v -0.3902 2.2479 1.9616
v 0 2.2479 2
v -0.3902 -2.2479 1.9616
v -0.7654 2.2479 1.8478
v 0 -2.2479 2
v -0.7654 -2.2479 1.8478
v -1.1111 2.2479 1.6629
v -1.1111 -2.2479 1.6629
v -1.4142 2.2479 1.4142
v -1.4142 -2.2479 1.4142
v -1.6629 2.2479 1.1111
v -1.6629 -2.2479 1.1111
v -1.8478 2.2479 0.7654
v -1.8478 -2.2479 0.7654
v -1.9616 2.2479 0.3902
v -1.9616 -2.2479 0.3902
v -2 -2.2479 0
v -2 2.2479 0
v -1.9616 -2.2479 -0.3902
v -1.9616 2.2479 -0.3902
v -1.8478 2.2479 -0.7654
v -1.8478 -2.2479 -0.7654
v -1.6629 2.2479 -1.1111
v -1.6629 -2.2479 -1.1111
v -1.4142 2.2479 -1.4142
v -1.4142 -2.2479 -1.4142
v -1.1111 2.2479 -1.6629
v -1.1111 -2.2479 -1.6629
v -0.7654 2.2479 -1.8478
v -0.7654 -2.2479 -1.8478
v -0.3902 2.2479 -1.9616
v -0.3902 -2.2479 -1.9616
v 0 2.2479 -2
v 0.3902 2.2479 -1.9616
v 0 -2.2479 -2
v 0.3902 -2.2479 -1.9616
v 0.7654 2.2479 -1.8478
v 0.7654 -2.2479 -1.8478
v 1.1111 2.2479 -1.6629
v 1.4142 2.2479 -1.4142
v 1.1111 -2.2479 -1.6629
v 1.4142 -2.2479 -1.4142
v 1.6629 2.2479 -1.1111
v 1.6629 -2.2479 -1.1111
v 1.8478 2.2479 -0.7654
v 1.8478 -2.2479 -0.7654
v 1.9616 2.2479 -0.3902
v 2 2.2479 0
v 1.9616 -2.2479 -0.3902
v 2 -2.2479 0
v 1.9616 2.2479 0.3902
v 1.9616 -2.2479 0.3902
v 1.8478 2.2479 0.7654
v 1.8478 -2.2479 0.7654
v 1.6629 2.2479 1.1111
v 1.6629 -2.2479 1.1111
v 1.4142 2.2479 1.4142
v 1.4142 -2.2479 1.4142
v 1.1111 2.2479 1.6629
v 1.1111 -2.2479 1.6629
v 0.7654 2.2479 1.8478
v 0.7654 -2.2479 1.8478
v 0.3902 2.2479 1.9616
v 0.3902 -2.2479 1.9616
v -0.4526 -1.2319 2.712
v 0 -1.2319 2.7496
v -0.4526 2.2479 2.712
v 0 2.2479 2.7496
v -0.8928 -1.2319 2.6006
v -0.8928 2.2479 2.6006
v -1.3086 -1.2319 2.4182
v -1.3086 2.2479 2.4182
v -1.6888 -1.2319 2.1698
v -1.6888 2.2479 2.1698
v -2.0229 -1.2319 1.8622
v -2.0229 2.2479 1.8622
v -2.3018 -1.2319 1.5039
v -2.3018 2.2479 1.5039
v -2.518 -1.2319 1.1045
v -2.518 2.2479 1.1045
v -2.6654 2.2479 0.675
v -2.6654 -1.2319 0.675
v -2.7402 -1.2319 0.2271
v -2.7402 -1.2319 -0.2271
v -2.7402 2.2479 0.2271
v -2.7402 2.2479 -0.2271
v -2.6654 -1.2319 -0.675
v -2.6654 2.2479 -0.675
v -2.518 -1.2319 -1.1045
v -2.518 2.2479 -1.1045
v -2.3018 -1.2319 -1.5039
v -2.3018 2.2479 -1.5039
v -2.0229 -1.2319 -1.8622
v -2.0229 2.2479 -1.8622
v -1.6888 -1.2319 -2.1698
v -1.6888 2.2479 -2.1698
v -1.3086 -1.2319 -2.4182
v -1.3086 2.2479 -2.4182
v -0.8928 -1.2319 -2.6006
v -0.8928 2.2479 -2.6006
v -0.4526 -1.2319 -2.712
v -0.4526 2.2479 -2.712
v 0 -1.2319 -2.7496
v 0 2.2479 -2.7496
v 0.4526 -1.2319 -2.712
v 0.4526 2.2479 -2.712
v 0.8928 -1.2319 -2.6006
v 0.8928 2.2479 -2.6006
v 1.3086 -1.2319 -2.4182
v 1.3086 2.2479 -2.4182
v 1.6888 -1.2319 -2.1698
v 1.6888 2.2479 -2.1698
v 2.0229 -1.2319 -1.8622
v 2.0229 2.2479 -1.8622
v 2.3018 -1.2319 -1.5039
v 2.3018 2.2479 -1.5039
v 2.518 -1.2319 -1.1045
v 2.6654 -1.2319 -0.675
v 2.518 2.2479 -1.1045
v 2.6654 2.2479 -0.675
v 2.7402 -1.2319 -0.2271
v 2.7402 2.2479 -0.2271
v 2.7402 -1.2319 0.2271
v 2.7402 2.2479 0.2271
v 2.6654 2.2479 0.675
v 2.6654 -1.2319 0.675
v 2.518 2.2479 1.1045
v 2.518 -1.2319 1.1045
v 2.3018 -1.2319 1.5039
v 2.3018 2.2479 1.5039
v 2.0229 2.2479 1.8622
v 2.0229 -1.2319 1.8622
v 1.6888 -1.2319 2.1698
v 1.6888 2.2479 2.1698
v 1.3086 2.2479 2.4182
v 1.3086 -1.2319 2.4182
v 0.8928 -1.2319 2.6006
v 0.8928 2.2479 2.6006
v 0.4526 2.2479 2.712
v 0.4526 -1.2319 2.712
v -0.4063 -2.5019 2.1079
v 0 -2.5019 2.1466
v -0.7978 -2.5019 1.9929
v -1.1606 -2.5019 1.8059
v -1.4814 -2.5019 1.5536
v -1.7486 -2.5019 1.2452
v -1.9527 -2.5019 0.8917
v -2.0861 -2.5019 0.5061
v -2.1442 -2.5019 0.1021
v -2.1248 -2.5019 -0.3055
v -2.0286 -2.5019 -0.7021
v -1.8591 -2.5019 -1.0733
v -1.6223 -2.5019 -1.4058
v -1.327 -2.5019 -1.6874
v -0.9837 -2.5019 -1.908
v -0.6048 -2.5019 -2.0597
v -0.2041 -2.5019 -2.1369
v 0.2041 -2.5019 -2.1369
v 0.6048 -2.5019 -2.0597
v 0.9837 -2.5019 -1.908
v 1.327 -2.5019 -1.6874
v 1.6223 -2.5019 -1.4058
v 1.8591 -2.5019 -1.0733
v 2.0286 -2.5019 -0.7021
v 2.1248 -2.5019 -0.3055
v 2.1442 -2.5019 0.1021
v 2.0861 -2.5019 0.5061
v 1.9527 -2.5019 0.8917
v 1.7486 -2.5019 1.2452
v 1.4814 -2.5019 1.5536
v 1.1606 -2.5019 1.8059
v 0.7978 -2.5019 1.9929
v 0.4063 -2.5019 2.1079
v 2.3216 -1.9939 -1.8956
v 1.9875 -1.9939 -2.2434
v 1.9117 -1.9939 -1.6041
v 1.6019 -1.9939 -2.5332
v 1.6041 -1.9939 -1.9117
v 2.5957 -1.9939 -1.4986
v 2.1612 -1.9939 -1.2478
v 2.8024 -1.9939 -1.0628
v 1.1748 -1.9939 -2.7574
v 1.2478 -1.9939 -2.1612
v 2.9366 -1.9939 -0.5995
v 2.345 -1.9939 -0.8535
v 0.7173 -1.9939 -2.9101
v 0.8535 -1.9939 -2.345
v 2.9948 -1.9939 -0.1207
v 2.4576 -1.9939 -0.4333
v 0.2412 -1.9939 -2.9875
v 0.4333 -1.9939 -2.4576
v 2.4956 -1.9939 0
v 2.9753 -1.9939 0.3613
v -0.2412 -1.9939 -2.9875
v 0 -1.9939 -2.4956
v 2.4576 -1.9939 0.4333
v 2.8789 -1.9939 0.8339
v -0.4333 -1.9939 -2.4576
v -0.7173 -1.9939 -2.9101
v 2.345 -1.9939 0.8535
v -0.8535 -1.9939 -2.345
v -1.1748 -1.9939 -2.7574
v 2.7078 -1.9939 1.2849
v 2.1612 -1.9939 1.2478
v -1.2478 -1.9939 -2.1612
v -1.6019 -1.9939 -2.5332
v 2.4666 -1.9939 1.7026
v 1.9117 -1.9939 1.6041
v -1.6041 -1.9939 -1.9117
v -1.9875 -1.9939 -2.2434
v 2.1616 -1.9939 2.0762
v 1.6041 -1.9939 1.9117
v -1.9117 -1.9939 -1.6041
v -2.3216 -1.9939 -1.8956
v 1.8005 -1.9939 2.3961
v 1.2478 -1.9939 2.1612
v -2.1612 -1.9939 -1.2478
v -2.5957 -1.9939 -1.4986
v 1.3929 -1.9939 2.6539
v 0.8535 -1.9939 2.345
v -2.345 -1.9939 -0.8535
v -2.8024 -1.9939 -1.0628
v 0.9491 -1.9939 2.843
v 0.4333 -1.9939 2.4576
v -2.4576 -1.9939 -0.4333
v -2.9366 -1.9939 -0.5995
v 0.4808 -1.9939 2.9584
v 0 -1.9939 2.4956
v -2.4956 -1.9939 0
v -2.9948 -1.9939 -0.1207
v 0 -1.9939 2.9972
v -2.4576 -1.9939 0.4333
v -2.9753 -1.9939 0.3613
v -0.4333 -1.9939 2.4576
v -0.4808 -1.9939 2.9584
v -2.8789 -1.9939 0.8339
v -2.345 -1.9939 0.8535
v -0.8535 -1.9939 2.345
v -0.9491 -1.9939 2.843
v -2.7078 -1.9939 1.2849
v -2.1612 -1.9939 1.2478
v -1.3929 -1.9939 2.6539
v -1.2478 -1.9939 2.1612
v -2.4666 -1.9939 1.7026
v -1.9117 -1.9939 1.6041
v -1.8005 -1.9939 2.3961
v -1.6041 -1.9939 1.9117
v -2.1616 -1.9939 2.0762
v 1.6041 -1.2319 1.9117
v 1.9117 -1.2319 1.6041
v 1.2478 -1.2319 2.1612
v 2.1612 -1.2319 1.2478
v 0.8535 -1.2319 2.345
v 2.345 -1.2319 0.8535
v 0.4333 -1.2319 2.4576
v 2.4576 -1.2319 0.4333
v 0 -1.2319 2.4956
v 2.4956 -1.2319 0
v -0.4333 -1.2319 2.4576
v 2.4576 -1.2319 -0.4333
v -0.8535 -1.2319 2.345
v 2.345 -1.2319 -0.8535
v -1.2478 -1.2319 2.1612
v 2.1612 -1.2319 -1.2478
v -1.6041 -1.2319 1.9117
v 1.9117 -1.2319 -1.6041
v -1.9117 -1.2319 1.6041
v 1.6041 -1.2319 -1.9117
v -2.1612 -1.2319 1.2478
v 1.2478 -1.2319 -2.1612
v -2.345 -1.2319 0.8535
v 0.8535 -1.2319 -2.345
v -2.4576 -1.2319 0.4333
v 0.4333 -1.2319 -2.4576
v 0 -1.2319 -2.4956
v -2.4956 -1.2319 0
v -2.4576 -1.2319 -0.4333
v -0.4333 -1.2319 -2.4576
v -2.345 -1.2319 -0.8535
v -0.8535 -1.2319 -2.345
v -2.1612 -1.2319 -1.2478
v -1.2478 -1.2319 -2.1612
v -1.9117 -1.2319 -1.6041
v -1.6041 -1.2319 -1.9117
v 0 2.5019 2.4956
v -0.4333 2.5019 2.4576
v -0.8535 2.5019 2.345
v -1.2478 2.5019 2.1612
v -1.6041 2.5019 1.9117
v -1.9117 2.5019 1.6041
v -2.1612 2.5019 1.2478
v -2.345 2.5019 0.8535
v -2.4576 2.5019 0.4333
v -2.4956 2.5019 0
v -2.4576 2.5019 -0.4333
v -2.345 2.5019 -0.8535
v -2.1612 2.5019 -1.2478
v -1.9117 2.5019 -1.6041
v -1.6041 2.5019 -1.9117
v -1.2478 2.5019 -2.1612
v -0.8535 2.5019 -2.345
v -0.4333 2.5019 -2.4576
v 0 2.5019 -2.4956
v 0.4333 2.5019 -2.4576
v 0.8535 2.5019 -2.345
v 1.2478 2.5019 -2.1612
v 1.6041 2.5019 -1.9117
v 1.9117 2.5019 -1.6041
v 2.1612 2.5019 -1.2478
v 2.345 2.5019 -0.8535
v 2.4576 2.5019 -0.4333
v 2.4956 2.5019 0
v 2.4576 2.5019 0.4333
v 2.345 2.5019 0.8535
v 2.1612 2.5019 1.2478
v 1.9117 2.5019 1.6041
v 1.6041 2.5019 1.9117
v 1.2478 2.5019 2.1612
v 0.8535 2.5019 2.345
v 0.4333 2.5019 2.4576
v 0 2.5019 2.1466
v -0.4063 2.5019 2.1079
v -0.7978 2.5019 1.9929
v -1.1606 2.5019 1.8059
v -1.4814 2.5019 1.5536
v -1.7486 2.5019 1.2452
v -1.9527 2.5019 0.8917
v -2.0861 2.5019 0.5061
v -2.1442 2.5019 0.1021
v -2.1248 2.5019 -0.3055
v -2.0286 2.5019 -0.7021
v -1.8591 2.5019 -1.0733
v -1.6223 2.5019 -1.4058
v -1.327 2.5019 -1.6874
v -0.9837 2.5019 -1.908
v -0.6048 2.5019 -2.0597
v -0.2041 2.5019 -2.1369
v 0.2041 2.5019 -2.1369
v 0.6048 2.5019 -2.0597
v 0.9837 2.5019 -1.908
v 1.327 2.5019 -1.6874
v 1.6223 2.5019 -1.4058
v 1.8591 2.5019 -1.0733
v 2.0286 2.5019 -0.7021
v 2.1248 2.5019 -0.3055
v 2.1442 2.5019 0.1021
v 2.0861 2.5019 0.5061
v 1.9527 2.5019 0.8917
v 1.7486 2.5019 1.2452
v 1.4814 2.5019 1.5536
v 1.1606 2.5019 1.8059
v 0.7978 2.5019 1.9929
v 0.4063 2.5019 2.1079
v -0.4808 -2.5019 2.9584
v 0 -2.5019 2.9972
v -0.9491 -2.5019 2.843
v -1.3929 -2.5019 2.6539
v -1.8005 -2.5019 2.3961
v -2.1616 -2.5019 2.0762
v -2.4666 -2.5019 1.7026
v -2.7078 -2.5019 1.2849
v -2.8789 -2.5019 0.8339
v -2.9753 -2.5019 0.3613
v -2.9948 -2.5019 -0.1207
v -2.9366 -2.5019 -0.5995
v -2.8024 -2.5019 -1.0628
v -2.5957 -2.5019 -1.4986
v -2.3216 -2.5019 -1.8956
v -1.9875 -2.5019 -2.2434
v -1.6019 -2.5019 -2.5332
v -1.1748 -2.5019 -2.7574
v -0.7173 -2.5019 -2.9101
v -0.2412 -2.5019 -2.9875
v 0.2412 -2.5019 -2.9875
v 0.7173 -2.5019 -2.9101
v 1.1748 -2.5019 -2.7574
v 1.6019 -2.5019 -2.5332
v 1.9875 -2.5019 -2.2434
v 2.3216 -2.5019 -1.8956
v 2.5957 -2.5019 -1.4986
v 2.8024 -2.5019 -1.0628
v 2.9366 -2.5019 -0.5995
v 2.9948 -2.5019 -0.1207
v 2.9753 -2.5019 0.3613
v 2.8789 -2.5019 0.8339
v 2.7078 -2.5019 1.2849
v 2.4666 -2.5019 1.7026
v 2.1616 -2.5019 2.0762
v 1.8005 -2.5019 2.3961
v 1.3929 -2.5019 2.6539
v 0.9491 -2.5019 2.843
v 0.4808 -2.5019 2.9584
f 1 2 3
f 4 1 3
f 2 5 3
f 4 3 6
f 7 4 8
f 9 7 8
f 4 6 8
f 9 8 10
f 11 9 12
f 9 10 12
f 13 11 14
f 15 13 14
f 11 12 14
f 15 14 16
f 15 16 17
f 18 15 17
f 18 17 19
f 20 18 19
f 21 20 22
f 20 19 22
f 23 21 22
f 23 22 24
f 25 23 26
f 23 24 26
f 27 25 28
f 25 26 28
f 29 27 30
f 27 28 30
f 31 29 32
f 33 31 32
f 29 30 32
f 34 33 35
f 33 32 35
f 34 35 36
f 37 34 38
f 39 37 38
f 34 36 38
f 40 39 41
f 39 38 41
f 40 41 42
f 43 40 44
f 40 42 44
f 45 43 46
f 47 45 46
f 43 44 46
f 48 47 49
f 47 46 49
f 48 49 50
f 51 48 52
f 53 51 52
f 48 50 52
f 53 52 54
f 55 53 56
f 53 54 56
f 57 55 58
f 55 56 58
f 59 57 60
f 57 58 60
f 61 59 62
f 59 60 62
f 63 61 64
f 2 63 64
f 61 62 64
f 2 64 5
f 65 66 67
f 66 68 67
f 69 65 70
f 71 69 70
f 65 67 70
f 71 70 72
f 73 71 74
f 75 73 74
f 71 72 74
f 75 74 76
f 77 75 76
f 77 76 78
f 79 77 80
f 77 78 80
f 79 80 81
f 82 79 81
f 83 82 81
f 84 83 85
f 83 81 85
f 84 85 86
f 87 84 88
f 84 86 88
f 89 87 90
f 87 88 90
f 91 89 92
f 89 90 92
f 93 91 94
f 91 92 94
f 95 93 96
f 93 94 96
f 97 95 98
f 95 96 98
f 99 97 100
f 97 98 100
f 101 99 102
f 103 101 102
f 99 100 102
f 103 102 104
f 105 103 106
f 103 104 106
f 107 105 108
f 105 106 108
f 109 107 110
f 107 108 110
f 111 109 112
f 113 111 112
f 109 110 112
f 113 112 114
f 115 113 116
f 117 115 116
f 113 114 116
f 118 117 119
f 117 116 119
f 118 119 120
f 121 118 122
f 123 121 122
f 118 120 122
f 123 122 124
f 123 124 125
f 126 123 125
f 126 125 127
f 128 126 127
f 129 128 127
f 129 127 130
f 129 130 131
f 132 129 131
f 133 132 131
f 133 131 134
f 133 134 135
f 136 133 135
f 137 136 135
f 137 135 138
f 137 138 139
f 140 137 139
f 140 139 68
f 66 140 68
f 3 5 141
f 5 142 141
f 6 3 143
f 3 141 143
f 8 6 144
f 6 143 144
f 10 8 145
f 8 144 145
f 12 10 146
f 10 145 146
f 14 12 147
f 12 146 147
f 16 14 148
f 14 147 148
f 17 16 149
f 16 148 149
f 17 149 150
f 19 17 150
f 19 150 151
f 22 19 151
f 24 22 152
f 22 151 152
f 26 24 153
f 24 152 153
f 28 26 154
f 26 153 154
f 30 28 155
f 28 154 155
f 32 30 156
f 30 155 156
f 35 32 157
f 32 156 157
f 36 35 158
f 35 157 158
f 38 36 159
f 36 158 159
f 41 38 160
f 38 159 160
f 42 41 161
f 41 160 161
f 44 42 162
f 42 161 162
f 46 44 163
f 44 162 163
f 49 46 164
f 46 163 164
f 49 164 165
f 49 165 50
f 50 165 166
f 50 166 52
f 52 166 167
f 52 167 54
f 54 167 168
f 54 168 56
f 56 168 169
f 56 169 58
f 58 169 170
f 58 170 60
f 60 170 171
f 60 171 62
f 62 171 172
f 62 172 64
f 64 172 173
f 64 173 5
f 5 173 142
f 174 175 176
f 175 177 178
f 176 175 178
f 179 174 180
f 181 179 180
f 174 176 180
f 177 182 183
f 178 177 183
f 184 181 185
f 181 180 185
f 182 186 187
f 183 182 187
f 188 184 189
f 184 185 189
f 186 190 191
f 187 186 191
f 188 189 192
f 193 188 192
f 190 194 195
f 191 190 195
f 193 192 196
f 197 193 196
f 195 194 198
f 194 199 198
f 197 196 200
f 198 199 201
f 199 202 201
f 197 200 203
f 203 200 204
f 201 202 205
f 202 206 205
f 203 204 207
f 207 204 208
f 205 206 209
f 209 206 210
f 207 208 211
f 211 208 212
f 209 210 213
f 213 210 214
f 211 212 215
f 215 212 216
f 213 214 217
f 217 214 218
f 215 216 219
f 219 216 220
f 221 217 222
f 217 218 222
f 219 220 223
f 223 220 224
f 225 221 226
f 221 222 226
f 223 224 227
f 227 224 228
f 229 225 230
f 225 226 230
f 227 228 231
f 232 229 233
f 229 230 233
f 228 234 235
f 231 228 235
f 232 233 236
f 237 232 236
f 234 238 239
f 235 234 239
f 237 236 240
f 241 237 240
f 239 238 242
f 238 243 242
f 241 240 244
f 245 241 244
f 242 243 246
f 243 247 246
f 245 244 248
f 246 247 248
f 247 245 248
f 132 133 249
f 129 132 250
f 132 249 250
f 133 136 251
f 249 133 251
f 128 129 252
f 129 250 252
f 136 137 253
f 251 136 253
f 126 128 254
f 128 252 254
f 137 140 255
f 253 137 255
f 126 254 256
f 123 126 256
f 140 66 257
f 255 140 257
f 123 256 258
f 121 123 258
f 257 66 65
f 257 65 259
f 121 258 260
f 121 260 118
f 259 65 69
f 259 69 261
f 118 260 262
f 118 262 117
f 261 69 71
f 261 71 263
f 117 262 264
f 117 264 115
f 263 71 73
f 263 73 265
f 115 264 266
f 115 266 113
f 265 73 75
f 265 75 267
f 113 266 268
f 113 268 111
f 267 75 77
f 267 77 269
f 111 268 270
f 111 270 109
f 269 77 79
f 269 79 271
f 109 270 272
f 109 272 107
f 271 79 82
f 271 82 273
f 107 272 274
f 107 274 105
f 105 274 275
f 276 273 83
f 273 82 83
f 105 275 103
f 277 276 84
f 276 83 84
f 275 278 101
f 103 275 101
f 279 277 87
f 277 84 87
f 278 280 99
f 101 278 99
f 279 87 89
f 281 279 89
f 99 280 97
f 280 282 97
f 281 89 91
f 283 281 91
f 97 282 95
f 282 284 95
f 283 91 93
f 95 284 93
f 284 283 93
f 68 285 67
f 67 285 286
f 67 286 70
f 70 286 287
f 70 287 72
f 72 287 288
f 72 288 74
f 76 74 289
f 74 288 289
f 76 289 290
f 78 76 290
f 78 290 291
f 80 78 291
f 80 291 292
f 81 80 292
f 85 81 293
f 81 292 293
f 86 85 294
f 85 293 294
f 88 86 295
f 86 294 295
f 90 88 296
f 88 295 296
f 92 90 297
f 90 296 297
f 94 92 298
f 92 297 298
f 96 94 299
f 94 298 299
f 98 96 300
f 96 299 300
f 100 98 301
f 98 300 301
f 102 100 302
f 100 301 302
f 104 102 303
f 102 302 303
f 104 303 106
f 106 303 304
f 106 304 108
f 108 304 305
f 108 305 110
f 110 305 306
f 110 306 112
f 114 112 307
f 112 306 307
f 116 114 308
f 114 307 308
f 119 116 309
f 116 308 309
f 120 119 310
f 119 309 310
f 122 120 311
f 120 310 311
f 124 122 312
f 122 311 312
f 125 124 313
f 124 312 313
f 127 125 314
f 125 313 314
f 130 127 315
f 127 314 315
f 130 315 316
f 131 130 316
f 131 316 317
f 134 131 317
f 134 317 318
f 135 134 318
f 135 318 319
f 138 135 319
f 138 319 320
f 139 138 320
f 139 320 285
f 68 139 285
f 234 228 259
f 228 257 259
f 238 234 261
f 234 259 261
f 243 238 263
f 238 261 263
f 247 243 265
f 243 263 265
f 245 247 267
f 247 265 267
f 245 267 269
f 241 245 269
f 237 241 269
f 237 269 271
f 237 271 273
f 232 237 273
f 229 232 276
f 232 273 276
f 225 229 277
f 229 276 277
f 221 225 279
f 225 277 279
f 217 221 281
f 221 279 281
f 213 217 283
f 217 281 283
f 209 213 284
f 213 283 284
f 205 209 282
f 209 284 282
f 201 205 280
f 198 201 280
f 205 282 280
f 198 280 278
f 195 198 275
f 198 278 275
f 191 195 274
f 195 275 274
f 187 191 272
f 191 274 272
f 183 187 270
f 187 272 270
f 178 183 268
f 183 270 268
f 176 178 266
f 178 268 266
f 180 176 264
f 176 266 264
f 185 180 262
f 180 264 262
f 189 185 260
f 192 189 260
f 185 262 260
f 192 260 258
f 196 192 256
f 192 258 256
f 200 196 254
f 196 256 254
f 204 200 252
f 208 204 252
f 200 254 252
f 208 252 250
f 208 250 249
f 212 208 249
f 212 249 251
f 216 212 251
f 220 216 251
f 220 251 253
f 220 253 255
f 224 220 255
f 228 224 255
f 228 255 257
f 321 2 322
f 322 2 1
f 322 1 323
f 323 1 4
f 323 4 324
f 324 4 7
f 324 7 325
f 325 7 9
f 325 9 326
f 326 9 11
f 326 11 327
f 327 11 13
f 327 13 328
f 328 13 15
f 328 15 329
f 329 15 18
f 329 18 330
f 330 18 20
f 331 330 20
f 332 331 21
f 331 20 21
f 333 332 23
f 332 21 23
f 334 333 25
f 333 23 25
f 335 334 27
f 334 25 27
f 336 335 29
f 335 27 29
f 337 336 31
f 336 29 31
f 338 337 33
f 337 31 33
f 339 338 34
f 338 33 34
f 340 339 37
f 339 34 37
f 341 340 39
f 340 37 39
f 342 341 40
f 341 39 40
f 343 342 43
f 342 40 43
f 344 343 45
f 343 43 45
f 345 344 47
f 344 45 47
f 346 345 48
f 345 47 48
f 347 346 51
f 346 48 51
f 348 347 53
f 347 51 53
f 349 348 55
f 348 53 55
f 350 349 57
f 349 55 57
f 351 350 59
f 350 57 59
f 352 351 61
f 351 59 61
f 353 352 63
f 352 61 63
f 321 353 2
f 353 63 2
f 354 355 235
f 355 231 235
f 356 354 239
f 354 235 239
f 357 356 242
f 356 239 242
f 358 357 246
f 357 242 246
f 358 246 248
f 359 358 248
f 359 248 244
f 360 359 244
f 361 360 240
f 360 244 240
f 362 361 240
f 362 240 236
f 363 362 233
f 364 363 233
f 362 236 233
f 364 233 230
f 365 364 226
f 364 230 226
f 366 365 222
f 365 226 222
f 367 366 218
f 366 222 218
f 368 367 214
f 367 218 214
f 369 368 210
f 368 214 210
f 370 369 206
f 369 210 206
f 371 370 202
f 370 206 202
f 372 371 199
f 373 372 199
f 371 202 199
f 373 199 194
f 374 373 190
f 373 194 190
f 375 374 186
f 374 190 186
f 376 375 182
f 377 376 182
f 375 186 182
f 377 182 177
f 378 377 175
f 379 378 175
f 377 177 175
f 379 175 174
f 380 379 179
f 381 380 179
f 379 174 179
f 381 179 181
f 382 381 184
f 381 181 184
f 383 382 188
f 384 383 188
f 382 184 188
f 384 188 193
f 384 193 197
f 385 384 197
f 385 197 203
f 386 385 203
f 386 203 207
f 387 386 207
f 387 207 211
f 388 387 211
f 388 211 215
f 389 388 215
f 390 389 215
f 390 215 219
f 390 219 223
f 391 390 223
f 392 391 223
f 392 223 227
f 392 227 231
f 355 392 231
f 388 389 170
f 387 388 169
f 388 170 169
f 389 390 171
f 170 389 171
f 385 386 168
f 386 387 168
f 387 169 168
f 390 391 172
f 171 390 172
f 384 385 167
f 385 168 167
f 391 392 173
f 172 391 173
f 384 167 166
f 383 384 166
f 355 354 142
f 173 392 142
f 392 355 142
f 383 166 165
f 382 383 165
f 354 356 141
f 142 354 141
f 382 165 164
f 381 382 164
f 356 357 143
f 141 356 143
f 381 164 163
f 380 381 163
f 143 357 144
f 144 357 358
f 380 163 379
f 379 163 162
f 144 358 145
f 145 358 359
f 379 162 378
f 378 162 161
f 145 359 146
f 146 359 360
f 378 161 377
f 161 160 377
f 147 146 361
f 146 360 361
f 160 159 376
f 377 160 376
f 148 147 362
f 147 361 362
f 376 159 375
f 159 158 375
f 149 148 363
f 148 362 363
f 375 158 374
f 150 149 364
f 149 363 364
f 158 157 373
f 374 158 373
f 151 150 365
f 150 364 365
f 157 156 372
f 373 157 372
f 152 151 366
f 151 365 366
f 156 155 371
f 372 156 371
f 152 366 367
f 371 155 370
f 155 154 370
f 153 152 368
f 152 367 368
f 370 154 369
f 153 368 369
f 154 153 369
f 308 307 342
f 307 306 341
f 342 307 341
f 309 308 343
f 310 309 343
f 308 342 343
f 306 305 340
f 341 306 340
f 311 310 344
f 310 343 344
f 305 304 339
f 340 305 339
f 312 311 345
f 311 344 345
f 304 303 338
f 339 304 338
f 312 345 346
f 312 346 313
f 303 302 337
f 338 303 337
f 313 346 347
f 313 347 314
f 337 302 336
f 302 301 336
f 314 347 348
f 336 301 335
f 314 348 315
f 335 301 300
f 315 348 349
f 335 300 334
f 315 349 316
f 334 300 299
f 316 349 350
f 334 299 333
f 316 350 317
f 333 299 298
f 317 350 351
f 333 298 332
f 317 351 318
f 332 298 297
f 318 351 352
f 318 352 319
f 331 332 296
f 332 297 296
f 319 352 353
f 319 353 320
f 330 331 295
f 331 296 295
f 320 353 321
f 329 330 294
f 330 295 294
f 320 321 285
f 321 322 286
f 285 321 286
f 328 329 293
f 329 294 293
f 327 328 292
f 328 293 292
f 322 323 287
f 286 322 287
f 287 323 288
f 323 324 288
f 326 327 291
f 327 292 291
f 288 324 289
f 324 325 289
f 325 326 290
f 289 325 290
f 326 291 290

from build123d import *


with BuildPart() as part:
    # Sketch1 → Revolve1 (revolve)
    with BuildSketch(Plane.XY, mode=Mode.PRIVATE) as revolve1_sk:
        Polygon((2.146646968, -2.5019), (2.9972, -2.5019), (2.9972, -1.9939), (2.49555, -1.9939), (2.49555, -1.2319), (2.74955, -1.2319), (2.74955, 2.2479), (2.49555, 2.5019), (2.146646968, 2.5019), (2, 2.2479), (2, -2.2479), align=None)
    revolve(revolve1_sk.sketch.rotate(Axis((0, 2.5019, 0), (0, -1, 0)), 90), axis=Axis((0, 2.5019, 0), (0, -1, 0)))  # turned: the seam where the file's is


solid = part.part
